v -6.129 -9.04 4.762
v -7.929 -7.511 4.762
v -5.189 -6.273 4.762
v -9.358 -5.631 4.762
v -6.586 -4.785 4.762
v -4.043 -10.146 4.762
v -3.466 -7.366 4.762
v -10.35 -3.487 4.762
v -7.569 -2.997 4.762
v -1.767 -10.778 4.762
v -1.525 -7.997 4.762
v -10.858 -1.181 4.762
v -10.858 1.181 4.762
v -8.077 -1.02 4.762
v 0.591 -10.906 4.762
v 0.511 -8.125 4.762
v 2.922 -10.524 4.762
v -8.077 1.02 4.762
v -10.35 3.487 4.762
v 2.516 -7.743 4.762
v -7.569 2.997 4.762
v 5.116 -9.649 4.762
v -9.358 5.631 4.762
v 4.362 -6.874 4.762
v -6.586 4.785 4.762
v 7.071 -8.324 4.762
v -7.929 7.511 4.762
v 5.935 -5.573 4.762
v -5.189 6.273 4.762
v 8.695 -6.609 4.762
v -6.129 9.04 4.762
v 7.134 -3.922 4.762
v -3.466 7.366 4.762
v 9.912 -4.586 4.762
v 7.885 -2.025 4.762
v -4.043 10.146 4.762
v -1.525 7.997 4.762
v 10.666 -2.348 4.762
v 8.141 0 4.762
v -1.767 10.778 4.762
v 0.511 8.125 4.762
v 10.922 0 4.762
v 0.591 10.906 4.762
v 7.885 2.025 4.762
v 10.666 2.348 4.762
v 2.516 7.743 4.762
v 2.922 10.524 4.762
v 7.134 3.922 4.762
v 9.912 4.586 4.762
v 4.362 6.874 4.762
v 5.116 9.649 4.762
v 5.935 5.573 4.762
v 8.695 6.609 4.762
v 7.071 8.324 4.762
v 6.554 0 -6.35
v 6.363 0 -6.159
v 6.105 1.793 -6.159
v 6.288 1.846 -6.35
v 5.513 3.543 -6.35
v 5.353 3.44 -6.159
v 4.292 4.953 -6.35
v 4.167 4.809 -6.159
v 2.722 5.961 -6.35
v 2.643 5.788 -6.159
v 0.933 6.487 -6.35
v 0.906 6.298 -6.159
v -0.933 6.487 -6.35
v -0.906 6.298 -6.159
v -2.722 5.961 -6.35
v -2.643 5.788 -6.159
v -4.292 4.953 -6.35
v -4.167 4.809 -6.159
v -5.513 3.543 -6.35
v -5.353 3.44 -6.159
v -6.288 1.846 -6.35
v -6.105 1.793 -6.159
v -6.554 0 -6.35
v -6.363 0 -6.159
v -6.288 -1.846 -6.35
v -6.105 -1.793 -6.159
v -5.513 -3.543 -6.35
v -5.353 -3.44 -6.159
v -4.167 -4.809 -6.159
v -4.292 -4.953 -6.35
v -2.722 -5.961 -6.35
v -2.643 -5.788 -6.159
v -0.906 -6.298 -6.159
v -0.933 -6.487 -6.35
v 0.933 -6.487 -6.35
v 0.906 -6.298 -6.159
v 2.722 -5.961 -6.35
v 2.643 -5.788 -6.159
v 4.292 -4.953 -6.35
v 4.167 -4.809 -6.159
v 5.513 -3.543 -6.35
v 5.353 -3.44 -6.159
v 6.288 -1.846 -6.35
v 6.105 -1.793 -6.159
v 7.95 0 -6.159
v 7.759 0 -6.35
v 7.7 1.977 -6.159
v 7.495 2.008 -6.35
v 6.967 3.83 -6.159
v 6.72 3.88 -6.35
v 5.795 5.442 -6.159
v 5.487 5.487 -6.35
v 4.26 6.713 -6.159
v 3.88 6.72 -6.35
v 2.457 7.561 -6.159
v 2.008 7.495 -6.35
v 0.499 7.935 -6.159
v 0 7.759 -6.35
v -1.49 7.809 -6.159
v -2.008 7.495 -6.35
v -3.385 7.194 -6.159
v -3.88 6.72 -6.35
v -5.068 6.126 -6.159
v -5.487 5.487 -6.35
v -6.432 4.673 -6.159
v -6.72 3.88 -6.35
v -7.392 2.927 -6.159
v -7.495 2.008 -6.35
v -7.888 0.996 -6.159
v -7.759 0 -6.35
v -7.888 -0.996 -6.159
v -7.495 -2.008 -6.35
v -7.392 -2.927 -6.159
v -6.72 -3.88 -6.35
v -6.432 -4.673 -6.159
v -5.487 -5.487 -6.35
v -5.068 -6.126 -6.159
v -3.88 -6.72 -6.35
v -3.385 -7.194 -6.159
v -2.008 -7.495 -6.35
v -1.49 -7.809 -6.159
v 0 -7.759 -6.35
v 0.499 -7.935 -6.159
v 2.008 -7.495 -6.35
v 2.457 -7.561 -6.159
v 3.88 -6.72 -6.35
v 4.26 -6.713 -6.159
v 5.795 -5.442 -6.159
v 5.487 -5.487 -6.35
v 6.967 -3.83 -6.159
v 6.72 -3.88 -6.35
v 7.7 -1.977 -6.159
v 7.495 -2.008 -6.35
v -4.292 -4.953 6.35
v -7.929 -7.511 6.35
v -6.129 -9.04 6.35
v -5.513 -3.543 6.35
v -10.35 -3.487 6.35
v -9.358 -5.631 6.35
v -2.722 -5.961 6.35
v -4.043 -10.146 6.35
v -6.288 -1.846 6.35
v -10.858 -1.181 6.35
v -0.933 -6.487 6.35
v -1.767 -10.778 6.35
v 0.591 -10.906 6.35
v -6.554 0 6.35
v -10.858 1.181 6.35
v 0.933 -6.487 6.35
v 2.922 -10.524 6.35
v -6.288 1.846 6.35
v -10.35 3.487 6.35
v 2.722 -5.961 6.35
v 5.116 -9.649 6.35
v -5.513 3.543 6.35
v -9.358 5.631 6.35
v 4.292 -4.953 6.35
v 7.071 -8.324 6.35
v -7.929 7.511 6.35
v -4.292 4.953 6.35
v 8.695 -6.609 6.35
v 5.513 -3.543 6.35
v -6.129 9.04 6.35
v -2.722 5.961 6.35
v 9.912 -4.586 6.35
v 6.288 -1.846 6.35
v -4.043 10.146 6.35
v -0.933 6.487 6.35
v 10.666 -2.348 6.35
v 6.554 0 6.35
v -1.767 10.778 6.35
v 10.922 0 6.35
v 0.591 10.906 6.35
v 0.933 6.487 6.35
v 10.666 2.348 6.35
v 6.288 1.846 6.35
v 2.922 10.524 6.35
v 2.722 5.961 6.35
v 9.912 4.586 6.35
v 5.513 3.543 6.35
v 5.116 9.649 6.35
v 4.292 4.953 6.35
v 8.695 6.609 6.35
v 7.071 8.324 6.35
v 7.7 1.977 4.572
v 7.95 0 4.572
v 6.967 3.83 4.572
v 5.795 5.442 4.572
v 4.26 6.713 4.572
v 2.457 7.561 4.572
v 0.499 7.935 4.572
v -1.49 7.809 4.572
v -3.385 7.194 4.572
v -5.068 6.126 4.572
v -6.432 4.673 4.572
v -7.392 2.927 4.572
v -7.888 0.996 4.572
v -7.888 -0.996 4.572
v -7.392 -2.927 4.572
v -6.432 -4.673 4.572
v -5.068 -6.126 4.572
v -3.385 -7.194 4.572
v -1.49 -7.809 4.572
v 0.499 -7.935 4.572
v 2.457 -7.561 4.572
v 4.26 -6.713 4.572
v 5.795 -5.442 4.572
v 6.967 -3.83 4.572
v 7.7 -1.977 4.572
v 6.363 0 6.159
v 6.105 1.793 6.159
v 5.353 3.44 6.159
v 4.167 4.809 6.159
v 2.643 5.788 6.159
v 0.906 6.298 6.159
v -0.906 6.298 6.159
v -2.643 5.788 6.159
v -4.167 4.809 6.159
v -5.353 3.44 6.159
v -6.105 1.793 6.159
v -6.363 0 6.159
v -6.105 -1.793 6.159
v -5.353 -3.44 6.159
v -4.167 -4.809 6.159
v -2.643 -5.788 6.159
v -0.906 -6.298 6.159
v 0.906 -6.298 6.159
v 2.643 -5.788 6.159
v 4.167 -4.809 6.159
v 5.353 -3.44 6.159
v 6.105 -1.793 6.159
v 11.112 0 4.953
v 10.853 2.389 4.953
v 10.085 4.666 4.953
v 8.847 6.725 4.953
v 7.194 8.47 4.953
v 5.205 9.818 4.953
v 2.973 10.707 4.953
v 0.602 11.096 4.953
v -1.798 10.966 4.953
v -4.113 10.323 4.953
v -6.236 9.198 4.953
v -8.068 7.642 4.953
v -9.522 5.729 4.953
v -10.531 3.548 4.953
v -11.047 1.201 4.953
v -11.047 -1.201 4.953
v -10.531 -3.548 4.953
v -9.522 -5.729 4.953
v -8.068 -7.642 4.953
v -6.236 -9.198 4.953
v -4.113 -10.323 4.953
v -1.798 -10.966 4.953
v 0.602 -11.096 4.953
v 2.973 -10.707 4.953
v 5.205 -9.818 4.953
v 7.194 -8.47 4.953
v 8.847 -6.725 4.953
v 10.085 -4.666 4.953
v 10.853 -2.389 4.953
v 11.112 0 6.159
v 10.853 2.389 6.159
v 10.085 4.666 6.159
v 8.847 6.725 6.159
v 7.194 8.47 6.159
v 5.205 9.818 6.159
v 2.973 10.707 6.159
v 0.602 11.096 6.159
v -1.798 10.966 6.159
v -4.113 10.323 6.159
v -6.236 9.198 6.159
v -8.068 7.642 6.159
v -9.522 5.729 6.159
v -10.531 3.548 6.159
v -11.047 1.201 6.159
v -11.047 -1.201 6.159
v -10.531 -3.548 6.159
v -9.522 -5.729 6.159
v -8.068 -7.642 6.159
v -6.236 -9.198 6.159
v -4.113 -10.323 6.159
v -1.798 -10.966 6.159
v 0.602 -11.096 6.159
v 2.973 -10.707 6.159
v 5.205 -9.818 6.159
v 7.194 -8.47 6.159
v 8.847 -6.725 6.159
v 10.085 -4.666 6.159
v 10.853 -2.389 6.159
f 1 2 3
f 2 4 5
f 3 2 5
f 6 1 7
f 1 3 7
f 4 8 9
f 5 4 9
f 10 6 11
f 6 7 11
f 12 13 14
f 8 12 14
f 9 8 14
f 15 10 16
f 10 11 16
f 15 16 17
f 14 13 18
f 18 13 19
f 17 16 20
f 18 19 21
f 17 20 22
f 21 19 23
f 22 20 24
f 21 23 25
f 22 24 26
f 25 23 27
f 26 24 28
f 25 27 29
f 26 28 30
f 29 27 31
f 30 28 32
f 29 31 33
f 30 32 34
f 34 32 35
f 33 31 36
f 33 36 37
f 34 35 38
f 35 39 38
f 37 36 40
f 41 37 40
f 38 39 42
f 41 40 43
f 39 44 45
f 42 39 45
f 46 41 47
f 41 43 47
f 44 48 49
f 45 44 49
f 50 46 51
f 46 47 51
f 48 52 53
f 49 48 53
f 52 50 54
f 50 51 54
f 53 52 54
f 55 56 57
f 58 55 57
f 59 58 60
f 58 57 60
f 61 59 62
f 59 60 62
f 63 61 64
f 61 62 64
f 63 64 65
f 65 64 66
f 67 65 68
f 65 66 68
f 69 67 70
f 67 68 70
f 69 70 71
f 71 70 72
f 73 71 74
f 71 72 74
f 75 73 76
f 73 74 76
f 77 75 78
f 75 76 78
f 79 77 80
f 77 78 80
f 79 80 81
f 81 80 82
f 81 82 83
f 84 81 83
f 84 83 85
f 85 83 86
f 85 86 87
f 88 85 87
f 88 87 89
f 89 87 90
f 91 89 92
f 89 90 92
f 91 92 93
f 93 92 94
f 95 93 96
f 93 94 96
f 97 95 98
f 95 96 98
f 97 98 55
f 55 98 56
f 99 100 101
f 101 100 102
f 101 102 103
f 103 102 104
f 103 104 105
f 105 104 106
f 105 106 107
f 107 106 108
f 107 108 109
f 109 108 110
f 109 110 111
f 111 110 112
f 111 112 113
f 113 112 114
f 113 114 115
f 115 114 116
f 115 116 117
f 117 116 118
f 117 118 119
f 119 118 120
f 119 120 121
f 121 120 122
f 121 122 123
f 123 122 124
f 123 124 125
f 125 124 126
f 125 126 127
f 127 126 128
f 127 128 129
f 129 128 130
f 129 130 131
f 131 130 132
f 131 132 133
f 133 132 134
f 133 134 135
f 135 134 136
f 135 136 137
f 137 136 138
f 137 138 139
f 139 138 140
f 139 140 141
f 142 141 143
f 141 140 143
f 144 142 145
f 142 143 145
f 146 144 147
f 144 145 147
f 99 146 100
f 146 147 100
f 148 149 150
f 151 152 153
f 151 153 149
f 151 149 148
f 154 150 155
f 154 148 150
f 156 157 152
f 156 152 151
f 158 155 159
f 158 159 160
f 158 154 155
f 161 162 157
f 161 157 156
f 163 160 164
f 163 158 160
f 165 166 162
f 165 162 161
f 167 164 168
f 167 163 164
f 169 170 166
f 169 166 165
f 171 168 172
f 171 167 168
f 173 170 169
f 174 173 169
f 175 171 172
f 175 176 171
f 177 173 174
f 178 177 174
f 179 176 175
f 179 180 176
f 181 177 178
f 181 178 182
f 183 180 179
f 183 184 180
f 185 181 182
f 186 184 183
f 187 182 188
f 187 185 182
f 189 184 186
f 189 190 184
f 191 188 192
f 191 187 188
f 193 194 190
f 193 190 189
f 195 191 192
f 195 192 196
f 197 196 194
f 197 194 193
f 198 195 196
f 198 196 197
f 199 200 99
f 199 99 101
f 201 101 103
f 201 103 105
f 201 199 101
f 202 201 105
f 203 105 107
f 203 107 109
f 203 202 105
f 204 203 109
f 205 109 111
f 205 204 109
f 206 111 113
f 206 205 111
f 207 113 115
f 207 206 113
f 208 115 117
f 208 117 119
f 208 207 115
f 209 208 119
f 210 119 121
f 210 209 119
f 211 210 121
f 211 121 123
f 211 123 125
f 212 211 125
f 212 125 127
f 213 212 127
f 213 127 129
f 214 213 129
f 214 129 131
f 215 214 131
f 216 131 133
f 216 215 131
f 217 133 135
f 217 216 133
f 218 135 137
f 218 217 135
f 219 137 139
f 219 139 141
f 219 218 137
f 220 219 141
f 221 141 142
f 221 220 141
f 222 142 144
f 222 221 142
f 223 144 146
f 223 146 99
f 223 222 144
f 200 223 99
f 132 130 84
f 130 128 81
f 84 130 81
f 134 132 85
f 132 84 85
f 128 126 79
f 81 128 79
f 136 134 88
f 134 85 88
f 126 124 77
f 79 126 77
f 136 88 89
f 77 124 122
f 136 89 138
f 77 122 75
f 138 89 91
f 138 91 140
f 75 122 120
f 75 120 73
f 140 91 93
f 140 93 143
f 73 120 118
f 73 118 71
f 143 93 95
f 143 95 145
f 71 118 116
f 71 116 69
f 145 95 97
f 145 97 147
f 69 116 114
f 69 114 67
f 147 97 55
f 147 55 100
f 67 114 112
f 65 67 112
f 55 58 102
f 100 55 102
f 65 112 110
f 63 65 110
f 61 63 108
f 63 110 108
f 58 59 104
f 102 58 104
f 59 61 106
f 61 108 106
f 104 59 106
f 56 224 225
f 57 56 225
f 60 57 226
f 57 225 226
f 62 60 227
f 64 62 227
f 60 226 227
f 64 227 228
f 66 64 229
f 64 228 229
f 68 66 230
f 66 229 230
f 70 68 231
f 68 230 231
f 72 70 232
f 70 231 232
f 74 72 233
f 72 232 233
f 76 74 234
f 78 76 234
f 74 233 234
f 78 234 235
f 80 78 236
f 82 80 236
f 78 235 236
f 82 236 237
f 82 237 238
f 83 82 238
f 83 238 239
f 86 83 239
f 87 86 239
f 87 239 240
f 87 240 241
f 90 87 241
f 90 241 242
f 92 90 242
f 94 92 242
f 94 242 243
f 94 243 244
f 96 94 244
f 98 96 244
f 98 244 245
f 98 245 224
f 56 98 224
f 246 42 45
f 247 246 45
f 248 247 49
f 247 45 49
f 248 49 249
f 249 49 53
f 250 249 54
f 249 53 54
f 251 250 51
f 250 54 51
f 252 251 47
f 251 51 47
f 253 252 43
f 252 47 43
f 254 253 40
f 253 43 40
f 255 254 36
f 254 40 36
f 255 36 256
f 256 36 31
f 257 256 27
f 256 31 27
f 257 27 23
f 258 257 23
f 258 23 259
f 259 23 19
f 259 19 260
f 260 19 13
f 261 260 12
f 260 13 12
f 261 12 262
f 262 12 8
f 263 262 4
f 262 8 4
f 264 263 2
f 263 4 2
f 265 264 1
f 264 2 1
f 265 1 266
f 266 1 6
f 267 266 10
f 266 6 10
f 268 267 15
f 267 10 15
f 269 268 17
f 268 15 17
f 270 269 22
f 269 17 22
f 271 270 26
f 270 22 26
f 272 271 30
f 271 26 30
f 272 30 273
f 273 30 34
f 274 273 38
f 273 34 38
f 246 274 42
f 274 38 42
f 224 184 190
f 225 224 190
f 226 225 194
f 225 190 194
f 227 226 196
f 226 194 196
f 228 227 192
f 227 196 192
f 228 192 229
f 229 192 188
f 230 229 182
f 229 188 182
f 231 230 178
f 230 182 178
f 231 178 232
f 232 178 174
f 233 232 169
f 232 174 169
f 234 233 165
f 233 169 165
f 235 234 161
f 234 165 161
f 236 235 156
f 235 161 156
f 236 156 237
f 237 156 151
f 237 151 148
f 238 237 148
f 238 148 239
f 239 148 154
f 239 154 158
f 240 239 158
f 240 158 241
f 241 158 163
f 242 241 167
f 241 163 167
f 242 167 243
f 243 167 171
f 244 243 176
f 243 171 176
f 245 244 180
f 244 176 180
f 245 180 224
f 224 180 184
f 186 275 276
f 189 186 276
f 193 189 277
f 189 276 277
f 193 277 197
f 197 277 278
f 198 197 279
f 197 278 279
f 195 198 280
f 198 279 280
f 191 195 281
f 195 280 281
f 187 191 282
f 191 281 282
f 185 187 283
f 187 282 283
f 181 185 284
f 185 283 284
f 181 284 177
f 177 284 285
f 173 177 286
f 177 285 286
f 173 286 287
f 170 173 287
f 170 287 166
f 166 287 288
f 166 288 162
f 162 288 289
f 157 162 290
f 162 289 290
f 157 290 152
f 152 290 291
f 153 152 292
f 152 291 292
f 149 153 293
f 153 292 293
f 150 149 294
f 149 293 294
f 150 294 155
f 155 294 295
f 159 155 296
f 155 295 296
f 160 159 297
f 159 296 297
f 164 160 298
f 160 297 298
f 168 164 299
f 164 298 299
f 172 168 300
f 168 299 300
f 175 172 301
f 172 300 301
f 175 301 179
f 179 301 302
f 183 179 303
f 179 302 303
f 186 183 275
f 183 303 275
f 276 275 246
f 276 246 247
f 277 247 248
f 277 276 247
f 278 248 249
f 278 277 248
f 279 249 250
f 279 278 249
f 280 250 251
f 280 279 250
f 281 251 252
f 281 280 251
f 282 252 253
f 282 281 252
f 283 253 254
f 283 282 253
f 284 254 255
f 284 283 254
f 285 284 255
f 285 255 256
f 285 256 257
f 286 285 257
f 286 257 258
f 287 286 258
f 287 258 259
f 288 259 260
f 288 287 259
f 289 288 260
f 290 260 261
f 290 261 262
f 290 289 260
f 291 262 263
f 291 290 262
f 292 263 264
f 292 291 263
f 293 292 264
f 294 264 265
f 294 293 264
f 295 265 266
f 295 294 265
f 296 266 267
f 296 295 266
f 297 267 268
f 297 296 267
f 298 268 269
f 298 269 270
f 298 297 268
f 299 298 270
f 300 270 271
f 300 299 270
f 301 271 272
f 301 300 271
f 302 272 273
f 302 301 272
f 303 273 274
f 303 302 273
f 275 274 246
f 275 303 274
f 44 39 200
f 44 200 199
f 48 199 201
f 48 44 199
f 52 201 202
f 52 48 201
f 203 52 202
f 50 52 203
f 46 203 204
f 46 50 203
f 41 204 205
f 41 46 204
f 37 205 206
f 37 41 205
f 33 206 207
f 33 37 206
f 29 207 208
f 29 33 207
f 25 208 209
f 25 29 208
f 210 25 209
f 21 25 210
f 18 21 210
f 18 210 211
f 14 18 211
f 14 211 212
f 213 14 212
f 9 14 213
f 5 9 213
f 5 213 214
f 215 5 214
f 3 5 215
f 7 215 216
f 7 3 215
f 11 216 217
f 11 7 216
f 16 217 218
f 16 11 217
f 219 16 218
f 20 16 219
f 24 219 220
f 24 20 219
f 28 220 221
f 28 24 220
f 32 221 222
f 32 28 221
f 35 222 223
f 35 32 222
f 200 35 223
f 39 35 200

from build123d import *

# Parameters (mm, degrees)
BOSS_EXTRUDE1_START = 6.35
SKETCH3_R           = 11.1125
SKETCH3_R_2         = 6.3627
BOSS_EXTRUDE1_DEPTH = 1.5875
BOSS_EXTRUDE2_START = 4.7625
SKETCH4_R           = 7.9502
SKETCH4_R_2         = 6.3627
BOSS_EXTRUDE2_DEPTH = 11.1125
CHAMFER1_SIZE       = 0.190881


with BuildPart() as part:
    # Sketch3 → Boss-Extrude1 (new body)
    with BuildSketch(Plane.XY.offset(BOSS_EXTRUDE1_START)):
        Circle(SKETCH3_R)
        Circle(SKETCH3_R_2, mode=Mode.SUBTRACT)
    extrude(amount=-BOSS_EXTRUDE1_DEPTH)

    # Sketch4 → Boss-Extrude2 (add)
    with BuildSketch(Plane.XY.offset(BOSS_EXTRUDE2_START)):
        Circle(SKETCH4_R)
        Circle(SKETCH4_R_2, mode=Mode.SUBTRACT)
    extrude(amount=-BOSS_EXTRUDE2_DEPTH)

    # Chamfer1
    chamfer1_edges = [part.edges().sort_by_distance(p)[0] for p in [
        (-6.3627, 0, -6.35),
        (-7.9502, 0, 4.7625),
        (-11.1125, 0, 6.35),
        (-11.1125, 0, 4.7625),
        (-6.3627, 0, 6.35),
        (-7.9502, 0, -6.35),
    ]]
    chamfer(chamfer1_edges, length=CHAMFER1_SIZE)


solid = part.part
